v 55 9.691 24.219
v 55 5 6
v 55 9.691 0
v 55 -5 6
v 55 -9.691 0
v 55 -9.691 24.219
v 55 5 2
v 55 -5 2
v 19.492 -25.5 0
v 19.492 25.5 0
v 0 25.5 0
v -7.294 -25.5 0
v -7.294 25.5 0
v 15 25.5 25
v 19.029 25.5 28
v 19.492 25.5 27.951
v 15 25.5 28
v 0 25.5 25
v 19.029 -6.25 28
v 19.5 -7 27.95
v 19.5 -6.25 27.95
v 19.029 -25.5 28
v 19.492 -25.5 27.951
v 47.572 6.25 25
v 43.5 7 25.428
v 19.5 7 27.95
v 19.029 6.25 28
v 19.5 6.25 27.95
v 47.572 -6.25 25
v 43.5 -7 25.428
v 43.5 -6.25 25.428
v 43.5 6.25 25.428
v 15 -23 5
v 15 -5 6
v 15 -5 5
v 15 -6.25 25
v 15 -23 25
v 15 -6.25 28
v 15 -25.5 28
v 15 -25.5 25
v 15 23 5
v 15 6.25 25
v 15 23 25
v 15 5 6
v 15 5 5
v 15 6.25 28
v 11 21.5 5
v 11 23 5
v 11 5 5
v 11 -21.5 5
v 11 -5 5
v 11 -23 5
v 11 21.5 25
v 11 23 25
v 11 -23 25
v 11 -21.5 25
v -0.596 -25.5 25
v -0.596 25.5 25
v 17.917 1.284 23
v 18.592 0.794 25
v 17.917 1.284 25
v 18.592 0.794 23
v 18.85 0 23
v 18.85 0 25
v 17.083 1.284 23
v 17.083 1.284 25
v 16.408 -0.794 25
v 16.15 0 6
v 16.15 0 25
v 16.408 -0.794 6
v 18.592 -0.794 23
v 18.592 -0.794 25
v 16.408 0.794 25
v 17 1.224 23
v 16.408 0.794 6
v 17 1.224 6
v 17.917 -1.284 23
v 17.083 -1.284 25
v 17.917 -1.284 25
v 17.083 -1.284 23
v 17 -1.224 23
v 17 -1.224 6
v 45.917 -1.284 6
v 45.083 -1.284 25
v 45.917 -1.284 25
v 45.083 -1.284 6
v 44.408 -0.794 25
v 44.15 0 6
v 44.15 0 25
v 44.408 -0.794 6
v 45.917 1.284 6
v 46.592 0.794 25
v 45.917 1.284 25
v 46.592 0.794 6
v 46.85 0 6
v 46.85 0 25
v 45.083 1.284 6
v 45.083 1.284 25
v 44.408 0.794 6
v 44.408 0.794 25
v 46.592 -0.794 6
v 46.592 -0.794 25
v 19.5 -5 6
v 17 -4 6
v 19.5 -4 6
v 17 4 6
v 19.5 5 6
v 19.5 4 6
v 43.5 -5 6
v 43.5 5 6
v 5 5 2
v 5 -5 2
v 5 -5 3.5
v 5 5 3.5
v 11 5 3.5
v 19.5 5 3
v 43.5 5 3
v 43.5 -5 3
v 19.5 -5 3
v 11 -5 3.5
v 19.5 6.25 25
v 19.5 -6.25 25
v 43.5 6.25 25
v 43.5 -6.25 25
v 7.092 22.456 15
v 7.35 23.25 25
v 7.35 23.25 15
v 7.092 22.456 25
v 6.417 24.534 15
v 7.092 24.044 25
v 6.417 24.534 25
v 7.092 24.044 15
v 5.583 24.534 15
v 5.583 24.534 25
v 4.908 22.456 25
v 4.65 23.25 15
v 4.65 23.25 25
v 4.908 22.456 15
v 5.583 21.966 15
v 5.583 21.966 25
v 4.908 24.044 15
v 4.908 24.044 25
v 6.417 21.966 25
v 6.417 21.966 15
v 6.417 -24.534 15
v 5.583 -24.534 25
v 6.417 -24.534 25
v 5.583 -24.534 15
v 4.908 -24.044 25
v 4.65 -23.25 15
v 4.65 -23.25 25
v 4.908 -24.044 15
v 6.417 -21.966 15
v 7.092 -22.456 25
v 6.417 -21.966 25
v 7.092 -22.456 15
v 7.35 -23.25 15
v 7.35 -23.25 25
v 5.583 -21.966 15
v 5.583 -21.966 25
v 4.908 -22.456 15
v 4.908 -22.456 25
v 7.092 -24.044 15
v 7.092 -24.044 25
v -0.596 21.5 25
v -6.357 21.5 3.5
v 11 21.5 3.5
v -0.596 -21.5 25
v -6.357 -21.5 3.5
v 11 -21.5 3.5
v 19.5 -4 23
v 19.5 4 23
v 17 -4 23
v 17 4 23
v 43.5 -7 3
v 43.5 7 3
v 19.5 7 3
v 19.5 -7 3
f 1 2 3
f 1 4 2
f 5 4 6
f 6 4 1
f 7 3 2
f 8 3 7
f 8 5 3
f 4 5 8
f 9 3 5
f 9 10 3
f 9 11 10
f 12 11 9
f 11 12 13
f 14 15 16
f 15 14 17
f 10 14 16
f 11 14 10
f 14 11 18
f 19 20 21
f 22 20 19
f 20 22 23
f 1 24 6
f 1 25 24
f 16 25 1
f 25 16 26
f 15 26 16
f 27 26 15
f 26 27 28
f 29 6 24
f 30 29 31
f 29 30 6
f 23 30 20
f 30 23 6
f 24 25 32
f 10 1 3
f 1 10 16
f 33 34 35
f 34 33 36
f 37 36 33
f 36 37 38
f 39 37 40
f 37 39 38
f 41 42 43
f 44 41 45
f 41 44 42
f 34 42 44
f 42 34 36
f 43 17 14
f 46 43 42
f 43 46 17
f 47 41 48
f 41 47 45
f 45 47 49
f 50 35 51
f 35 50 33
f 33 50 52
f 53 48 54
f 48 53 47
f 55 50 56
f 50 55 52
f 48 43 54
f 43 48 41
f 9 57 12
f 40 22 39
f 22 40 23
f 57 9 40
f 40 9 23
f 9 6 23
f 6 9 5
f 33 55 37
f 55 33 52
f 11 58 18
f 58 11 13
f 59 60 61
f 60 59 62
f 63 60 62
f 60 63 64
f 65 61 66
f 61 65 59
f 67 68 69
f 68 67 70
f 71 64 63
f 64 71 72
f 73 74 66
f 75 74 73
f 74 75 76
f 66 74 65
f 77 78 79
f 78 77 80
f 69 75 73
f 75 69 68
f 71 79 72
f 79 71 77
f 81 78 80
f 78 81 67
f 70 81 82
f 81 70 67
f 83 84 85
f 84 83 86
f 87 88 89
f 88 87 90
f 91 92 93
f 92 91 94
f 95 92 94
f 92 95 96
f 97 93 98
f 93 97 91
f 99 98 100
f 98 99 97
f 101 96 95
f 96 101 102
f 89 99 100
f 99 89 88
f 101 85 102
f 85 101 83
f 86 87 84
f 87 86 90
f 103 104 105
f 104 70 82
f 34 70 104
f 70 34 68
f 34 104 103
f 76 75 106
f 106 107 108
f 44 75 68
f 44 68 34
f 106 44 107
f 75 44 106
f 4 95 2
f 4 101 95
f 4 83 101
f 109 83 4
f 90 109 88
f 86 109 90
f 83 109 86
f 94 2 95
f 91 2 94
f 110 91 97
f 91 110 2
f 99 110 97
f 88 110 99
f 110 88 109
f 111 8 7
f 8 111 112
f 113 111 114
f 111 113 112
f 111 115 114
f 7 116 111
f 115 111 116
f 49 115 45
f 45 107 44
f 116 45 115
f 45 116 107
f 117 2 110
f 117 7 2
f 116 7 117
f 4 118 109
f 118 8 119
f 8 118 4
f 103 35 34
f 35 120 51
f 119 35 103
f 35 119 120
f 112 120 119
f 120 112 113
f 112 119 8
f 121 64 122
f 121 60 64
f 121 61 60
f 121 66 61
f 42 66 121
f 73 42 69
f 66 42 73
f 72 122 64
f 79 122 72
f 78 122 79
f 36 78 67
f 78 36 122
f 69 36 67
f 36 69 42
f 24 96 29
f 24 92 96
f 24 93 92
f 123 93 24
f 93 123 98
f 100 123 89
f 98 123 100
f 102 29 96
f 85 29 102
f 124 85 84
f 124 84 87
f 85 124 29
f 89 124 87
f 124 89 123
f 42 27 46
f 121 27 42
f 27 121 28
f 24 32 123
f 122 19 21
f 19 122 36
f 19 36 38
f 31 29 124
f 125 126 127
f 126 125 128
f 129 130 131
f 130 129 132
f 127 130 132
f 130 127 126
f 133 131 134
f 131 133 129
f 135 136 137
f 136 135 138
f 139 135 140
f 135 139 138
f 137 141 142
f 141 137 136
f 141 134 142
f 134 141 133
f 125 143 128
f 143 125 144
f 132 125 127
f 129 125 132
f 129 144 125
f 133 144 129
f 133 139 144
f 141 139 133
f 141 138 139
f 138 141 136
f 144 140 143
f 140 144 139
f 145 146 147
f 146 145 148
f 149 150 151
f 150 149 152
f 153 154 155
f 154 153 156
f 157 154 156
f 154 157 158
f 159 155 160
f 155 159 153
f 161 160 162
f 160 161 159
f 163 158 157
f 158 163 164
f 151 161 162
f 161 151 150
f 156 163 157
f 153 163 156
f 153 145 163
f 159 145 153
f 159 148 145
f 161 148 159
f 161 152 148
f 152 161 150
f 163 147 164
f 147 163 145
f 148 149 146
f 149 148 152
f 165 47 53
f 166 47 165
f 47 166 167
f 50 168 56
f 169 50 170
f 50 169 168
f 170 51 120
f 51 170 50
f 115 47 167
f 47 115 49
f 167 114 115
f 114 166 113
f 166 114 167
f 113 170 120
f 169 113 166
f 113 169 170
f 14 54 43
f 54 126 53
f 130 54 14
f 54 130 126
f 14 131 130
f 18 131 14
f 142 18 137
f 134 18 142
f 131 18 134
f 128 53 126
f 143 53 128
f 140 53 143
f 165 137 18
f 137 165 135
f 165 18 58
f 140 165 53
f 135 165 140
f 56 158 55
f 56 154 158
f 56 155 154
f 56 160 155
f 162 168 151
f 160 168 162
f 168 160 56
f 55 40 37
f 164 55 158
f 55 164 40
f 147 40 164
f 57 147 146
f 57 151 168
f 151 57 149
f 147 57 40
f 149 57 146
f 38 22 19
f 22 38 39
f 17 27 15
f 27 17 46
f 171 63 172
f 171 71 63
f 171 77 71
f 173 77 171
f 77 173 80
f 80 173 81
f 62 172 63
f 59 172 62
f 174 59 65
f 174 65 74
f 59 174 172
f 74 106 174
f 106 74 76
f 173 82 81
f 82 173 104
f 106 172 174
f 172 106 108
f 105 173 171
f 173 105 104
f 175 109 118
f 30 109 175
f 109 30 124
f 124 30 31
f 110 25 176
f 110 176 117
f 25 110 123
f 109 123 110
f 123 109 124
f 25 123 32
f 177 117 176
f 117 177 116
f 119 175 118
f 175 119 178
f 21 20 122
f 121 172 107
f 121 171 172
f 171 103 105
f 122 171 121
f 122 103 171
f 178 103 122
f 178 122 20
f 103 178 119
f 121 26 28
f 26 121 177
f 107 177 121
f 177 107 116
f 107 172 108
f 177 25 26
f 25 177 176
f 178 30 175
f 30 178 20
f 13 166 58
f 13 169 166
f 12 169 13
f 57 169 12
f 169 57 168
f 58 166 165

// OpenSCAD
module mediaCabeza(){
	translate([0,0,30]) mirror([0,0,1]) difference(){	
		translate([0,-27.5,0]){ difference(){
			cube([55,53,30]);
			rotate([0,-6,0]) translate([0,0,-30]) cube([60,60,30]);
			translate([15,55,0]){rotate([0,0,-24]){cube([100,30,30]);}}}
		}
		translate([0,-60,0])cube([60,60,60]);
		translate([11,0,0])cube([4,23,25]); //Ranura para US
		translate([11,0,22])cube([4,20,3]);} //Ranura para componentes US
}


largoTornillos=28;

difference(){
	union(){
		translate([0,-0.000000000000000000000000001,0]) mediaCabeza();
//Esto ultimo es una chapuza para poder exportar el archivo.
		mirror([0,1,0]) mediaCabeza();
		translate([-20,-25.5,0])cube([20,51,26]);
	}
	translate([5,-5,2]){cube([80,10,4]);} //Canal para cableado
	translate([17.5,0,3])union(){ //tornillos
		cylinder(r=1.35,h=25,$fn=10);
		translate([largoTornillos,0,0])cylinder(r=1.35,h=25,$fn=10);
	}
	translate([15,-12.5/2,25])cube([33,12.5,25.6]); //pestañas del servo
	translate([6,23.25,15])cylinder(r=1.35,h=20, $fn=10);
	translate([6,-23.25,15])cylinder(r=1.35,h=20, $fn=10);
	translate([-10,-43/2,5])cube([25,43,50]);//US HUECOS
	translate([-14,-43/2,3.5])cube([25,43,50]); //US huecos
	translate([-5,-26,25])cube([20,52,40]);//altura delantera
	translate([0,-80,28])cube([80,160,40]);//altura total
	translate([17,-4,3])cube([5,8,20]); //cables montaje servo
	translate([19.5,-7,3])cube([24,14,30]); //montaje servo
	translate([-28,-40,0])rotate([0,15,0])cube([20,80,60]); //cara
}
